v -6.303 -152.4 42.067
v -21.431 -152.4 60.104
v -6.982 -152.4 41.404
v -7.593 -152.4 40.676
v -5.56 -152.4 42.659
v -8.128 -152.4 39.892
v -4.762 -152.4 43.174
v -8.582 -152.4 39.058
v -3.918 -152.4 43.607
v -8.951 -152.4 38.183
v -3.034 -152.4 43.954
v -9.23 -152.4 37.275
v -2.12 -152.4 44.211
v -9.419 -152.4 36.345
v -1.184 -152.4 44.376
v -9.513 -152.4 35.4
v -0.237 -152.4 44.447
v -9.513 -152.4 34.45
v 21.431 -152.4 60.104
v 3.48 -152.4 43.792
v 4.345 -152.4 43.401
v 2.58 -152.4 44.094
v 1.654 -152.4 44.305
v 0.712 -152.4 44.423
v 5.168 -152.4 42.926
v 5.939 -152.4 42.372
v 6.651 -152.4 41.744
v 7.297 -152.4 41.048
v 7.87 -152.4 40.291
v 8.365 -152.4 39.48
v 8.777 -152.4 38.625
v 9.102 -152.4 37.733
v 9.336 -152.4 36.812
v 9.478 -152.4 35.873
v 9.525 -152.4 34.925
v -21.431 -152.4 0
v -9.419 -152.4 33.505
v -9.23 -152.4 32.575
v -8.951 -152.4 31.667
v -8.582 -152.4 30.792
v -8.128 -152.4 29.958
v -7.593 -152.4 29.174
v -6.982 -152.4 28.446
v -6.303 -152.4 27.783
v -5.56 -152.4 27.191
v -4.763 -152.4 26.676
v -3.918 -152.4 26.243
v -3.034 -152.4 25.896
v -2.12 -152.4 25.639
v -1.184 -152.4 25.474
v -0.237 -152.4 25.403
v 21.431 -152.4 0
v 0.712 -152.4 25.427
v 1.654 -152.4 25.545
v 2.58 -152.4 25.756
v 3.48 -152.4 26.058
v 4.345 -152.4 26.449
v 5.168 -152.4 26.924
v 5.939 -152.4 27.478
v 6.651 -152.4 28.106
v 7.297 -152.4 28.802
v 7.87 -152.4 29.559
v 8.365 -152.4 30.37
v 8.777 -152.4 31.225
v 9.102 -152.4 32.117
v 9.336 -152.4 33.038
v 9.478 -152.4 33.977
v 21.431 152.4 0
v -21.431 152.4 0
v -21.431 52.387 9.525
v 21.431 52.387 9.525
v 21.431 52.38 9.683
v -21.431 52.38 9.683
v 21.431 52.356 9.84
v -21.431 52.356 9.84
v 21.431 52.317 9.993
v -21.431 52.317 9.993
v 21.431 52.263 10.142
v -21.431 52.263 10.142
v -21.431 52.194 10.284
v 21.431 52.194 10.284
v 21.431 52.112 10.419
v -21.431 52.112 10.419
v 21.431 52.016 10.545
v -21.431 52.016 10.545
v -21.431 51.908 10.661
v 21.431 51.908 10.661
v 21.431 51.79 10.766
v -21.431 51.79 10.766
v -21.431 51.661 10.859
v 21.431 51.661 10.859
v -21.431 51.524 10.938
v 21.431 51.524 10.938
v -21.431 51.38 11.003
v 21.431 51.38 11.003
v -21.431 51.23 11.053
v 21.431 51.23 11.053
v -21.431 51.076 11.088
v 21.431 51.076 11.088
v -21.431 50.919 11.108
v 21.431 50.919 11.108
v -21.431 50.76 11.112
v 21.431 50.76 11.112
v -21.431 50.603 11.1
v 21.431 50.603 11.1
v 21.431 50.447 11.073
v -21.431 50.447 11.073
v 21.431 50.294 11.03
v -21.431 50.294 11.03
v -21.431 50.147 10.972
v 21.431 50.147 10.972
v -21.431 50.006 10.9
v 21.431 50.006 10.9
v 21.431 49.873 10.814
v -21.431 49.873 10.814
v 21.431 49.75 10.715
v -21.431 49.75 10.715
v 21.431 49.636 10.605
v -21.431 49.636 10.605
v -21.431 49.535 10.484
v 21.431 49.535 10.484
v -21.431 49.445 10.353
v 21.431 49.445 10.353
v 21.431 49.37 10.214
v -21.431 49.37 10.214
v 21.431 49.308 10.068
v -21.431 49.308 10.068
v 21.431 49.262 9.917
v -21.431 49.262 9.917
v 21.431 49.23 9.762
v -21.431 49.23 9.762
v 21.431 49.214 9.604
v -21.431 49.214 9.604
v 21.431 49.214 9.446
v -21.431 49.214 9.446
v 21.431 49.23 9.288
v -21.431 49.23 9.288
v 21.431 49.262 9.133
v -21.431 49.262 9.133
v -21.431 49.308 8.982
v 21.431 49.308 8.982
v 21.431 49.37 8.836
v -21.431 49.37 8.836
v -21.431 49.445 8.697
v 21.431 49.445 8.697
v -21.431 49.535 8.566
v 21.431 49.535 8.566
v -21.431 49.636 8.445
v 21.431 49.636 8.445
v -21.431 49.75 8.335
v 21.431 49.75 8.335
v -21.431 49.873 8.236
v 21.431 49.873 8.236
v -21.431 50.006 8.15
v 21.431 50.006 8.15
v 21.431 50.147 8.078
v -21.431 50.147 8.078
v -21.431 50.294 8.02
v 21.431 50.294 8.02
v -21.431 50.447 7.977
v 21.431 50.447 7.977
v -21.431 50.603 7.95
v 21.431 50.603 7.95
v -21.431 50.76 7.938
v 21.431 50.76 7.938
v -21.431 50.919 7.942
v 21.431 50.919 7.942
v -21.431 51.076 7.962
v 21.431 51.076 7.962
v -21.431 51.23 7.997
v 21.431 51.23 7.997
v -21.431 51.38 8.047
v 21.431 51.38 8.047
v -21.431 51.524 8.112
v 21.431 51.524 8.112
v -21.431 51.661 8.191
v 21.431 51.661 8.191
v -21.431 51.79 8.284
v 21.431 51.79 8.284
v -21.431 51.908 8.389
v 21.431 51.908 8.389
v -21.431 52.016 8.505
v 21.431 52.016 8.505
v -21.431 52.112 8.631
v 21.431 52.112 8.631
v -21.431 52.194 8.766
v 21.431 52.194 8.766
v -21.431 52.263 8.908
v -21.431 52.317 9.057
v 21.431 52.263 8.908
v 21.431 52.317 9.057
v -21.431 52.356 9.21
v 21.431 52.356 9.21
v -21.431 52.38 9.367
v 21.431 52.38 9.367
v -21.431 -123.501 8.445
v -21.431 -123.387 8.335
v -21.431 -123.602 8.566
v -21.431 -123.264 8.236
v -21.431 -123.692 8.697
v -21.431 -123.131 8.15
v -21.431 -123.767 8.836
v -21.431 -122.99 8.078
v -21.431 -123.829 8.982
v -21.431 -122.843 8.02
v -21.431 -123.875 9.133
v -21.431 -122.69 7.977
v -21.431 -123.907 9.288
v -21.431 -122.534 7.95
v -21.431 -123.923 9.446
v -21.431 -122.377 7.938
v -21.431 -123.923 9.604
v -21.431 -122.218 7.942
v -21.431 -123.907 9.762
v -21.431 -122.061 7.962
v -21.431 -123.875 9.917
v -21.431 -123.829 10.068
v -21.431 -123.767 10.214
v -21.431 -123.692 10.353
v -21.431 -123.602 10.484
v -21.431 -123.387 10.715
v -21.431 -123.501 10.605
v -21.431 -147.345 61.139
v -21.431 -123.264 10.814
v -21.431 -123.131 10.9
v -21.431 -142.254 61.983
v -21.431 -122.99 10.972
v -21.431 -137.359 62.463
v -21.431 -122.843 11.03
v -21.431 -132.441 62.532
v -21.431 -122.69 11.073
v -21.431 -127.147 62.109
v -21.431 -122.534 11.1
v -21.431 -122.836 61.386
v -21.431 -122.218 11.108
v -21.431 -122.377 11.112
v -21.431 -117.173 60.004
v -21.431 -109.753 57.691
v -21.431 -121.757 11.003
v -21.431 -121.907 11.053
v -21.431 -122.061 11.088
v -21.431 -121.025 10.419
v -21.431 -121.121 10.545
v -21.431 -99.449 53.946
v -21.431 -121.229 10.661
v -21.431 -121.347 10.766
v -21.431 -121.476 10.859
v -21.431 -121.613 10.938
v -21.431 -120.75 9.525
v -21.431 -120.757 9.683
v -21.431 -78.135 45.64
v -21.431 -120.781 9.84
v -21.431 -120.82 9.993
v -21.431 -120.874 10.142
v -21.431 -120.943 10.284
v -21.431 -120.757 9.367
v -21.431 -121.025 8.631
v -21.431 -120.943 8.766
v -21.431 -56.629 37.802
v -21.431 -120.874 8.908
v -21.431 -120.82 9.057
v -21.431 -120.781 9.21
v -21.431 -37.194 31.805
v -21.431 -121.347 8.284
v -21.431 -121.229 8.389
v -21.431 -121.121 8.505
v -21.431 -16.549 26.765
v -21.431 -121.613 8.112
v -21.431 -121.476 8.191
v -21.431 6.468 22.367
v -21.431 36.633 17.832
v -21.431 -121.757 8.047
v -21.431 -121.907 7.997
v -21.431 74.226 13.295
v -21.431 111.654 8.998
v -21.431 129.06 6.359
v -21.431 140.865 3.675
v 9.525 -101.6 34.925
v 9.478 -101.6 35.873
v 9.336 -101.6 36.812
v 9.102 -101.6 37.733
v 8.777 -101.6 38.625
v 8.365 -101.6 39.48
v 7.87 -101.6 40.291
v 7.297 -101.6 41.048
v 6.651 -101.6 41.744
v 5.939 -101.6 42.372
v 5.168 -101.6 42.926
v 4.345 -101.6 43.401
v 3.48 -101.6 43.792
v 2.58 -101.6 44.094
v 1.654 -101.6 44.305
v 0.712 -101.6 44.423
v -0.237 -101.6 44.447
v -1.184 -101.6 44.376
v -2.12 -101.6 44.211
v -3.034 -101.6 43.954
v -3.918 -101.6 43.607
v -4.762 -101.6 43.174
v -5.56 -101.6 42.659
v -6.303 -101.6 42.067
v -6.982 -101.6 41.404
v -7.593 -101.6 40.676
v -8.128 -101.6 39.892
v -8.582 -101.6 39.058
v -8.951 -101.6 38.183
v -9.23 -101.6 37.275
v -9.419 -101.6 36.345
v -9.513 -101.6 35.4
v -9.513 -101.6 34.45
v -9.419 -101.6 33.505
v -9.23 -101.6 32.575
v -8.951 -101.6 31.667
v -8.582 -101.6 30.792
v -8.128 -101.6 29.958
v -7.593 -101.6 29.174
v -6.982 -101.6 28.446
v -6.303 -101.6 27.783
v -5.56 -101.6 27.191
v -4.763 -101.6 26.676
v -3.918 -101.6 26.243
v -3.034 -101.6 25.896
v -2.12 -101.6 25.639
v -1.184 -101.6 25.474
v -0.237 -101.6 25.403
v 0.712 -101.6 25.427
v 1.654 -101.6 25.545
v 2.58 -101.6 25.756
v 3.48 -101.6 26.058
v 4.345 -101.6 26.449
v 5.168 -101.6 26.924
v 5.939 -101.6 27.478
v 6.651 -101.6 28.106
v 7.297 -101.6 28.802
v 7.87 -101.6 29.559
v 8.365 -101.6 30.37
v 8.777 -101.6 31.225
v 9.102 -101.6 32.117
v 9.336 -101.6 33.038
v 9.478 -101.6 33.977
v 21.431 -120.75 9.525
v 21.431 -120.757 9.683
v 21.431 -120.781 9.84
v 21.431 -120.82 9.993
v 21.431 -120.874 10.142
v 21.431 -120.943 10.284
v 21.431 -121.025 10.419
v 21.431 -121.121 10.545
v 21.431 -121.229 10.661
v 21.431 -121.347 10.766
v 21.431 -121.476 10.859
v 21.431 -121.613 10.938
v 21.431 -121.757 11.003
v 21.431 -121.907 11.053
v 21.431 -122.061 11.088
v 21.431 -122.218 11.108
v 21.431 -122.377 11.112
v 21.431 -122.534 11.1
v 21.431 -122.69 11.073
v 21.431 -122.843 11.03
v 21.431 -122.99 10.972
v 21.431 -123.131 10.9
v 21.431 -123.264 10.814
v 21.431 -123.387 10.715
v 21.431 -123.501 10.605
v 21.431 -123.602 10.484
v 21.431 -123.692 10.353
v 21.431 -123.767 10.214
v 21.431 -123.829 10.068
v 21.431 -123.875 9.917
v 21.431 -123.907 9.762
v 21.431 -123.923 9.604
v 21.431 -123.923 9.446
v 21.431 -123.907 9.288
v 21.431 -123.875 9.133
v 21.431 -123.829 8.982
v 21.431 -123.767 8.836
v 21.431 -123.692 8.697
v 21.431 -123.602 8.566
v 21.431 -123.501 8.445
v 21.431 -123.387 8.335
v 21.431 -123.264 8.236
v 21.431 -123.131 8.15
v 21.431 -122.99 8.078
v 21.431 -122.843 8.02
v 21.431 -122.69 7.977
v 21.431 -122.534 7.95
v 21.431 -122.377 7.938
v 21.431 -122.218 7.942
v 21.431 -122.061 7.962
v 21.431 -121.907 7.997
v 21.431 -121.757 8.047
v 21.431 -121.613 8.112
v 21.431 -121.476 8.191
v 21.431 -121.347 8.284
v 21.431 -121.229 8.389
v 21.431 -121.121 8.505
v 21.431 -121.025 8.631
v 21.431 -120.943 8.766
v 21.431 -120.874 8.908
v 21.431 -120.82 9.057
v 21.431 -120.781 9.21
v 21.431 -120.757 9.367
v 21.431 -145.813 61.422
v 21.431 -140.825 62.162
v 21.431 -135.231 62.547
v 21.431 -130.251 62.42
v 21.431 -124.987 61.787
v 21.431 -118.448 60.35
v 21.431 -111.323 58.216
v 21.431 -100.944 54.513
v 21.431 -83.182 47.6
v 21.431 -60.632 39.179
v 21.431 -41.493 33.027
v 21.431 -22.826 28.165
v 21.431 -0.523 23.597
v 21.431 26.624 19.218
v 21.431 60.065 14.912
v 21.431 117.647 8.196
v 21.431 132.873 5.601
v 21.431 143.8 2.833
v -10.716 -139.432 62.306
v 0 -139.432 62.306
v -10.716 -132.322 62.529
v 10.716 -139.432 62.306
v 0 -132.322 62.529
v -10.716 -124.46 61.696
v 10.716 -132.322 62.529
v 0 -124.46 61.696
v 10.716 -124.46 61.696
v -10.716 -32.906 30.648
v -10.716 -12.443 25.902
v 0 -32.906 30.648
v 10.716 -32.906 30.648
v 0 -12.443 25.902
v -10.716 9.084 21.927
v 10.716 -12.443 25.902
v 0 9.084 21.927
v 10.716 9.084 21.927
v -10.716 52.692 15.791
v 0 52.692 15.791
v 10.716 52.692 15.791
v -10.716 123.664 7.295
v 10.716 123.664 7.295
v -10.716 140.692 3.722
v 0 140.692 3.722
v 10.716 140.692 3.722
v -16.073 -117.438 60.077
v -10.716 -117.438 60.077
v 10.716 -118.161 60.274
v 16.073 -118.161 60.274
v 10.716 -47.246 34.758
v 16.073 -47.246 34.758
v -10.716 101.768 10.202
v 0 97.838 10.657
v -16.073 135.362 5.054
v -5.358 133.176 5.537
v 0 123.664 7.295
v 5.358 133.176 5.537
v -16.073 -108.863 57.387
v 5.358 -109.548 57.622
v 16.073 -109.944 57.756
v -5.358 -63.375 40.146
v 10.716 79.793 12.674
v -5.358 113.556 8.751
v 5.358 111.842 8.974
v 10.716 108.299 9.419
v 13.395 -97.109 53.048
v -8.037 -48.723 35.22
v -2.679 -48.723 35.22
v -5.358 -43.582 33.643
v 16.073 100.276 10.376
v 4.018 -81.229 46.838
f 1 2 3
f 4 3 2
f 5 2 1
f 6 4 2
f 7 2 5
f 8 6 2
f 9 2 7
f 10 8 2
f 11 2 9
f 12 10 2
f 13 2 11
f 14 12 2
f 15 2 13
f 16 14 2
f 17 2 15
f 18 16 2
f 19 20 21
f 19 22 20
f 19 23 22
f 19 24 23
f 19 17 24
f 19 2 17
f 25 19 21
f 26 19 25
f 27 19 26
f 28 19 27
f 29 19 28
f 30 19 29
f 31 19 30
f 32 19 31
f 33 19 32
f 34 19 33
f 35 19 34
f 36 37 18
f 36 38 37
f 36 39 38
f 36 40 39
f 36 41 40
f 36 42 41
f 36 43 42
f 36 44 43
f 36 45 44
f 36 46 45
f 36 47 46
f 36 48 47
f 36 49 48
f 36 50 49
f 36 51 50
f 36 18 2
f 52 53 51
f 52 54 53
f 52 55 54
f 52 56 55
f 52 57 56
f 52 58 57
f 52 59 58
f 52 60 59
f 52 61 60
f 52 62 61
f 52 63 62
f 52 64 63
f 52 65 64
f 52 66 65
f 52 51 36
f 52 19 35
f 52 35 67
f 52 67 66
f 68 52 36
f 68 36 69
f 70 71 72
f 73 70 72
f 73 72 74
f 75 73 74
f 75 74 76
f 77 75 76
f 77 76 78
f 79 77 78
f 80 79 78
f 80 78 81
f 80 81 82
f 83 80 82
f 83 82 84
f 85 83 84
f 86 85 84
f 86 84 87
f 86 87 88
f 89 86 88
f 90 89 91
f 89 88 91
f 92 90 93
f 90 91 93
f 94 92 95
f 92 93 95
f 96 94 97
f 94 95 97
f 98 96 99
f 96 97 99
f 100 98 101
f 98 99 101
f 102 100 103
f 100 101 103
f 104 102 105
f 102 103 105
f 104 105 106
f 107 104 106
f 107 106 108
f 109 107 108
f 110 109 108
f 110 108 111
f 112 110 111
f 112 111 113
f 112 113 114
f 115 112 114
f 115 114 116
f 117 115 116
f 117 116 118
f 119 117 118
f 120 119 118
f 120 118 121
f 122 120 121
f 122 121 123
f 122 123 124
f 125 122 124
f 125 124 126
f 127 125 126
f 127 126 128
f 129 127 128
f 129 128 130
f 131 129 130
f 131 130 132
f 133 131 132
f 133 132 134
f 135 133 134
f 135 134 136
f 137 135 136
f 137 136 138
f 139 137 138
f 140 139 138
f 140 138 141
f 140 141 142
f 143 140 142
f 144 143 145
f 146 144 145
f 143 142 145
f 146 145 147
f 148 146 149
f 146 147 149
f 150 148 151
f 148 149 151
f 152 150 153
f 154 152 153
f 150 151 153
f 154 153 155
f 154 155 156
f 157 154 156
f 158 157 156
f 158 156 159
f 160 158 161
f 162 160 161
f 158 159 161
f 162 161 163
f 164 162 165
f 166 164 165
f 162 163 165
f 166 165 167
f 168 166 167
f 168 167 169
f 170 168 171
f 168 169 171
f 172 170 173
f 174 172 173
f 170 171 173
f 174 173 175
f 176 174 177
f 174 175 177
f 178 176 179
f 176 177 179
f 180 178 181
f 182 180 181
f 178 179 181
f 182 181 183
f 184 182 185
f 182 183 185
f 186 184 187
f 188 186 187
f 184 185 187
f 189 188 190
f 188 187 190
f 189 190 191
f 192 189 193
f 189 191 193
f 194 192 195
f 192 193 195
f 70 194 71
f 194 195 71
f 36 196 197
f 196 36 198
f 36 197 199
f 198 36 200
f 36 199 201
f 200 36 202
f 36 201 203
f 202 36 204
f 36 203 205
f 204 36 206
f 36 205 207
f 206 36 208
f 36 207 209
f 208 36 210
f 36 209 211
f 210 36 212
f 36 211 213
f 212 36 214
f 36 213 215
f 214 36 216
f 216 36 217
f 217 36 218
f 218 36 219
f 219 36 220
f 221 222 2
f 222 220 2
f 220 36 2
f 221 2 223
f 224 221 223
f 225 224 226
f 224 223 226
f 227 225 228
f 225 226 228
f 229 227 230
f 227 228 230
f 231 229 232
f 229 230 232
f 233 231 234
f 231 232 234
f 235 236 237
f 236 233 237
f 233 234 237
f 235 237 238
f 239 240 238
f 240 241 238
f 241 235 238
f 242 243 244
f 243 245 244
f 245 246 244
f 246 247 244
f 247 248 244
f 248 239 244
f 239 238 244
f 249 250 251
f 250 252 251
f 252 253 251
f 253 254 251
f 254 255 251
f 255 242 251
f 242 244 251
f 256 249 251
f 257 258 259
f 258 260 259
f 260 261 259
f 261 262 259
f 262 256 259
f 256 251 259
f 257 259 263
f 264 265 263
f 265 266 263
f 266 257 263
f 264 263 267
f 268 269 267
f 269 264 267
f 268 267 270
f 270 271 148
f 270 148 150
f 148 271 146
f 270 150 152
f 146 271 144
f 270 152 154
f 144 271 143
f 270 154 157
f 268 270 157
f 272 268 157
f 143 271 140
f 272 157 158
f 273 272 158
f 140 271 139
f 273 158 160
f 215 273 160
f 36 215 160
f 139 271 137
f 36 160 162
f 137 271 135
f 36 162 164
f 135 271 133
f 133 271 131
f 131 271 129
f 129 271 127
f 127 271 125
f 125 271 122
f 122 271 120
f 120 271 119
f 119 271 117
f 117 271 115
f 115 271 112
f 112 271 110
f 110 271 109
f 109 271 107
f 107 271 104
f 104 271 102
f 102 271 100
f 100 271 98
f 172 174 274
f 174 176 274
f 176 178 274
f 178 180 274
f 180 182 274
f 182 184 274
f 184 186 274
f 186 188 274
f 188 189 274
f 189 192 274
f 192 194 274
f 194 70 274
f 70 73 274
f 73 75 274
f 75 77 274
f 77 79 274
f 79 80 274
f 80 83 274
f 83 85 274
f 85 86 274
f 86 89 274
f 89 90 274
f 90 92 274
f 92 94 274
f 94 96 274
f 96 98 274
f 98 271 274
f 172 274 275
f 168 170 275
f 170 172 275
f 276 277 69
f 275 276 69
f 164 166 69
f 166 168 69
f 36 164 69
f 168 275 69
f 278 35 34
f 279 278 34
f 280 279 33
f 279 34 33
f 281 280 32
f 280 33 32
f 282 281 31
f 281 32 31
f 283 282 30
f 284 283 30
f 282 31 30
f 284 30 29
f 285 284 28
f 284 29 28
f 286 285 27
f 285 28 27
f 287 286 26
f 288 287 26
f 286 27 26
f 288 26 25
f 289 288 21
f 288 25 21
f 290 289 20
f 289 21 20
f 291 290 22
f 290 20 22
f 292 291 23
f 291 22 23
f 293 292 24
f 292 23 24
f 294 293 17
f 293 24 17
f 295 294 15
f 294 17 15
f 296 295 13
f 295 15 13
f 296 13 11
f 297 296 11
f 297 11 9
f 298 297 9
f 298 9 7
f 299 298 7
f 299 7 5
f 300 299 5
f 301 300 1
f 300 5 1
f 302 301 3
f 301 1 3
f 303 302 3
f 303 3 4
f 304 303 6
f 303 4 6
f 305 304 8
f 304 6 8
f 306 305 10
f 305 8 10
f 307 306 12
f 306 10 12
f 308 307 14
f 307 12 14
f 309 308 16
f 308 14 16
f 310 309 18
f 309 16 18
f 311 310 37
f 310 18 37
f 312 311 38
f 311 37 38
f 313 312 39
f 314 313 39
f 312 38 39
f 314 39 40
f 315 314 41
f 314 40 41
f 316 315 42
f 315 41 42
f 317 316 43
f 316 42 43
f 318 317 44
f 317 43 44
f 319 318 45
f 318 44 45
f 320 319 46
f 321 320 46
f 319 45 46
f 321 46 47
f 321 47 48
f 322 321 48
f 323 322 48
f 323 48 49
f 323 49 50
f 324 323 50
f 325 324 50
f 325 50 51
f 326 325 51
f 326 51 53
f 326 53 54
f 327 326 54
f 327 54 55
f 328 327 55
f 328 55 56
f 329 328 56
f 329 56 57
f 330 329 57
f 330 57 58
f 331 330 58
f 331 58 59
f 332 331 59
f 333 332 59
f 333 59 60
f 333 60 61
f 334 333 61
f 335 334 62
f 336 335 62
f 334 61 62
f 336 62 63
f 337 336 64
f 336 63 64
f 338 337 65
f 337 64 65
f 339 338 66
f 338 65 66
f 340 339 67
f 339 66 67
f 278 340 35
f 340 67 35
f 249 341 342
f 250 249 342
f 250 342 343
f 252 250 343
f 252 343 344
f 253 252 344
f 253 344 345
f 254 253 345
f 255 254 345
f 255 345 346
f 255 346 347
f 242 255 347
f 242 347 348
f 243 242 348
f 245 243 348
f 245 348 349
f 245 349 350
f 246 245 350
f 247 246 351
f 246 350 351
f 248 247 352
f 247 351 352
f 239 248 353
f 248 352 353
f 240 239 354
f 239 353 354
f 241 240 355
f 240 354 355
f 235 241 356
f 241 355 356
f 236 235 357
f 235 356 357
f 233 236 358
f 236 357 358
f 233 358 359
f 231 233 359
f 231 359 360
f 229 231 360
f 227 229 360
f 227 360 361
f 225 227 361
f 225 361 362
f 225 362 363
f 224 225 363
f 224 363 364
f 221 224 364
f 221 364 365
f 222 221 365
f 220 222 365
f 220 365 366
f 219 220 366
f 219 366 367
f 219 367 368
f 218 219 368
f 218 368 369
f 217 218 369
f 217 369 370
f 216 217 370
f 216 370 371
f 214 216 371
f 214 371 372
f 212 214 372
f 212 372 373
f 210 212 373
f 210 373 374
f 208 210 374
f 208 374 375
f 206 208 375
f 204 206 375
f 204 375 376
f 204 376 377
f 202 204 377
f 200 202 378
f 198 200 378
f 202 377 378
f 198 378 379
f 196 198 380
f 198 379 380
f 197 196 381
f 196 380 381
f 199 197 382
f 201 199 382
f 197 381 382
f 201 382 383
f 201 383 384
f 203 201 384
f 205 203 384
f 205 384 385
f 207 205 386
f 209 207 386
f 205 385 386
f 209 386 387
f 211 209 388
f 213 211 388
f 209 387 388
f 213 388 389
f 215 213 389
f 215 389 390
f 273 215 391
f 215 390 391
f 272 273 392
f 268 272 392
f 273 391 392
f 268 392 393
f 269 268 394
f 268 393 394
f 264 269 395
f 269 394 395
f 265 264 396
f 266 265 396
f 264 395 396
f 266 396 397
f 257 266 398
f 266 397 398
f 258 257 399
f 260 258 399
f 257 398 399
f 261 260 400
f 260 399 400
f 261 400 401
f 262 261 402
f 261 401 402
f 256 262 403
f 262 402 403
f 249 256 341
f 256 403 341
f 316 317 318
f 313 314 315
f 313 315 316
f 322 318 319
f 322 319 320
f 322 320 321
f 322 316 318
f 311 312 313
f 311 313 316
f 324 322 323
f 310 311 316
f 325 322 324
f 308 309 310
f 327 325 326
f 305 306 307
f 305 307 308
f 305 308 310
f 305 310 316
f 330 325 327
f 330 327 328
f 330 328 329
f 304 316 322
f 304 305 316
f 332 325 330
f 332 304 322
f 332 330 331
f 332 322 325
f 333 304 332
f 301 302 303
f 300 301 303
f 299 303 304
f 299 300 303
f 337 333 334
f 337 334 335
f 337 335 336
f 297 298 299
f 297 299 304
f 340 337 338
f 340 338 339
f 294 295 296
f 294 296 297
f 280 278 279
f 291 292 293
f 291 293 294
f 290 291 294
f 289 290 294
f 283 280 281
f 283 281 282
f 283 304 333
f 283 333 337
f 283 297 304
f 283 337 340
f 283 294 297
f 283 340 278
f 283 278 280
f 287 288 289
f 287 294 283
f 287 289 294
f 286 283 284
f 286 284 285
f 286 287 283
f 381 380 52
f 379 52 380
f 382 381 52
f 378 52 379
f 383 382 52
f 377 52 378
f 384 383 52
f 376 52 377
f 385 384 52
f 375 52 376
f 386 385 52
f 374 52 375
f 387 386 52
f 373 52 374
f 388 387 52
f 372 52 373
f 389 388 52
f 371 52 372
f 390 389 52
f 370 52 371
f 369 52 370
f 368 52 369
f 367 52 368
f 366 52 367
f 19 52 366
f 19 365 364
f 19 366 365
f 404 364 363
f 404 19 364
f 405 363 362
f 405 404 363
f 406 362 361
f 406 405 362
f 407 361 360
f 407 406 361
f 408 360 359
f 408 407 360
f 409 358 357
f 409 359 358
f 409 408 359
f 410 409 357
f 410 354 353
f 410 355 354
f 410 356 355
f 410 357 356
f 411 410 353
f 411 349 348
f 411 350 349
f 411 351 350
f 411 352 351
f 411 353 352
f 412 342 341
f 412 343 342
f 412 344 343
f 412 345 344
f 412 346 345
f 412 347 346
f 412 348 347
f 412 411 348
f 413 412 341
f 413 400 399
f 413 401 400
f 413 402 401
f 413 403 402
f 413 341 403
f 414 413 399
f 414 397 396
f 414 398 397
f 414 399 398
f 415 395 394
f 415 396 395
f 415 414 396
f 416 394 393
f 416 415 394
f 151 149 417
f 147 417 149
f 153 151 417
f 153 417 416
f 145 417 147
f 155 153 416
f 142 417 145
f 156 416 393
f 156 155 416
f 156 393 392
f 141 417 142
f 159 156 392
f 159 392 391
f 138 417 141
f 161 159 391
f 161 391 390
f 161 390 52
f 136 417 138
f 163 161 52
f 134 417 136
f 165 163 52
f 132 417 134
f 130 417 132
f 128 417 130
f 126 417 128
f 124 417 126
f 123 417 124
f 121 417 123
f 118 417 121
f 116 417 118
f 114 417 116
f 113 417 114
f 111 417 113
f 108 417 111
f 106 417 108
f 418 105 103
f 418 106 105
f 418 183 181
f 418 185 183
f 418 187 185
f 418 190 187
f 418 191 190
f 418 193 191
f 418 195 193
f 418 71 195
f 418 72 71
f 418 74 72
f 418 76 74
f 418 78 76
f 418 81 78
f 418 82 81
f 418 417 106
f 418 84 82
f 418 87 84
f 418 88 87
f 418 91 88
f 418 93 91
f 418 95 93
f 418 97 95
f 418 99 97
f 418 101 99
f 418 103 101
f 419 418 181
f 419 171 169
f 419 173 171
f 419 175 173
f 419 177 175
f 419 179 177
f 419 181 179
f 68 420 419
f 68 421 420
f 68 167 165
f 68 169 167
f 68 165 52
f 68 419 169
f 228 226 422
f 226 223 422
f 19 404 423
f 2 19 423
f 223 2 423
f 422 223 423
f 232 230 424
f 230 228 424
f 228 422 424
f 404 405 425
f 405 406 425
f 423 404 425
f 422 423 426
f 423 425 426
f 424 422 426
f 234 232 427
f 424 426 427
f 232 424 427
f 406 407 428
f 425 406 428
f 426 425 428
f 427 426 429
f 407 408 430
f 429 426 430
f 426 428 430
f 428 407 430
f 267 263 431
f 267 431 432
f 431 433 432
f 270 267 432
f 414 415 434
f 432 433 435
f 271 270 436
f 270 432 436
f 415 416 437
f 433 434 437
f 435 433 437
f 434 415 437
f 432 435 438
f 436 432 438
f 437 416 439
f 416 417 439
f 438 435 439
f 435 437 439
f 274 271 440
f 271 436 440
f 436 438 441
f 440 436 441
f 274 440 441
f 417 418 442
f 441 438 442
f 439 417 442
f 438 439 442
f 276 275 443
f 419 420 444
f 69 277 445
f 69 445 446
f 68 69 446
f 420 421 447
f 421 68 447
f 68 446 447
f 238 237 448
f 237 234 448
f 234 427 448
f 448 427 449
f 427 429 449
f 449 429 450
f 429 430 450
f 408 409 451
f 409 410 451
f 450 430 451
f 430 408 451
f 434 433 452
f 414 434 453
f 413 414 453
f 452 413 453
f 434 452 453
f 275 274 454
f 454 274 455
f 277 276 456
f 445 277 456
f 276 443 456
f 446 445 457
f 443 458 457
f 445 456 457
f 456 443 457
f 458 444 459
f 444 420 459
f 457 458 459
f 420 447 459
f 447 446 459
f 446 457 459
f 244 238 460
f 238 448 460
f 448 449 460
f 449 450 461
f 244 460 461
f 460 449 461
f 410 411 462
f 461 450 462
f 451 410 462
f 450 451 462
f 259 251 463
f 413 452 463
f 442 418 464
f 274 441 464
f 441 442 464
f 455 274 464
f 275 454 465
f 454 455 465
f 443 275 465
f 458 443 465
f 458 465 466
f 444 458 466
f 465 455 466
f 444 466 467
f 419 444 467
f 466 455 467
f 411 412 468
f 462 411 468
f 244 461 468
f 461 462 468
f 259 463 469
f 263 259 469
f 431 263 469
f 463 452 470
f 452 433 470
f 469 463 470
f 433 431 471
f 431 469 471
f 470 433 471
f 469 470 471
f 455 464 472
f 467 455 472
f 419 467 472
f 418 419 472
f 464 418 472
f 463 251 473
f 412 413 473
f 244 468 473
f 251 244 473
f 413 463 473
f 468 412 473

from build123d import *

# Parameters (mm, degrees)
F1_DEPTH = 21.43125
F2_R     = 9.525
F3_DEPTH = 50.8
F4_R     = 1.5875
F5_DEPTH = 42.8635


with BuildPart() as f1:
    # F0 (on Right) → F1 (new body, symmetric)
    with BuildSketch(Plane.YZ):
        Polygon((-152.4, 69.85), (-152.4, 0), (152.4, 0), (152.4, 19.05), align=None)
    extrude(amount=F1_DEPTH, both=True)

    # F2 (on face) → F3 (cut)
    with BuildSketch(Plane.XZ.offset(152.4)):
        with Locations((0, 34.925)):
            Circle(F2_R)
    extrude(amount=-F3_DEPTH, mode=Mode.SUBTRACT)

    # F4 (on face) → F5 (intersect, through all)
    with BuildSketch(Plane.YZ.offset(21.43125)):
        with BuildLine():
            add(Edge.make_bspline(
                [(-152.4, 60.1042546332), (-143.977542079, 61.8846855271), (-119.9008707419, 66.9742745607), (-35.7816538858, 20.1727447549), (121.302857192, 10.7687664806), (145.1861012922, 2.498132741), (152.4, 0)],
                knots=[0, 0, 0, 0, 0.1595847878, 0.4561934915, 0.835744045, 1, 1, 1, 1], degree=3))
            Line((-152.4, 60.1042546332), (-152.4, 0))
            Line((-152.4, 0), (152.4, 0))
        make_face()
        with Locations((-122.337013483, 9.525)):
            Circle(F4_R, mode=Mode.SUBTRACT)
        with Locations((50.8, 9.525)):
            Circle(F4_R, mode=Mode.SUBTRACT)
    extrude(amount=-F5_DEPTH, mode=Mode.INTERSECT)


solid = f1.part
